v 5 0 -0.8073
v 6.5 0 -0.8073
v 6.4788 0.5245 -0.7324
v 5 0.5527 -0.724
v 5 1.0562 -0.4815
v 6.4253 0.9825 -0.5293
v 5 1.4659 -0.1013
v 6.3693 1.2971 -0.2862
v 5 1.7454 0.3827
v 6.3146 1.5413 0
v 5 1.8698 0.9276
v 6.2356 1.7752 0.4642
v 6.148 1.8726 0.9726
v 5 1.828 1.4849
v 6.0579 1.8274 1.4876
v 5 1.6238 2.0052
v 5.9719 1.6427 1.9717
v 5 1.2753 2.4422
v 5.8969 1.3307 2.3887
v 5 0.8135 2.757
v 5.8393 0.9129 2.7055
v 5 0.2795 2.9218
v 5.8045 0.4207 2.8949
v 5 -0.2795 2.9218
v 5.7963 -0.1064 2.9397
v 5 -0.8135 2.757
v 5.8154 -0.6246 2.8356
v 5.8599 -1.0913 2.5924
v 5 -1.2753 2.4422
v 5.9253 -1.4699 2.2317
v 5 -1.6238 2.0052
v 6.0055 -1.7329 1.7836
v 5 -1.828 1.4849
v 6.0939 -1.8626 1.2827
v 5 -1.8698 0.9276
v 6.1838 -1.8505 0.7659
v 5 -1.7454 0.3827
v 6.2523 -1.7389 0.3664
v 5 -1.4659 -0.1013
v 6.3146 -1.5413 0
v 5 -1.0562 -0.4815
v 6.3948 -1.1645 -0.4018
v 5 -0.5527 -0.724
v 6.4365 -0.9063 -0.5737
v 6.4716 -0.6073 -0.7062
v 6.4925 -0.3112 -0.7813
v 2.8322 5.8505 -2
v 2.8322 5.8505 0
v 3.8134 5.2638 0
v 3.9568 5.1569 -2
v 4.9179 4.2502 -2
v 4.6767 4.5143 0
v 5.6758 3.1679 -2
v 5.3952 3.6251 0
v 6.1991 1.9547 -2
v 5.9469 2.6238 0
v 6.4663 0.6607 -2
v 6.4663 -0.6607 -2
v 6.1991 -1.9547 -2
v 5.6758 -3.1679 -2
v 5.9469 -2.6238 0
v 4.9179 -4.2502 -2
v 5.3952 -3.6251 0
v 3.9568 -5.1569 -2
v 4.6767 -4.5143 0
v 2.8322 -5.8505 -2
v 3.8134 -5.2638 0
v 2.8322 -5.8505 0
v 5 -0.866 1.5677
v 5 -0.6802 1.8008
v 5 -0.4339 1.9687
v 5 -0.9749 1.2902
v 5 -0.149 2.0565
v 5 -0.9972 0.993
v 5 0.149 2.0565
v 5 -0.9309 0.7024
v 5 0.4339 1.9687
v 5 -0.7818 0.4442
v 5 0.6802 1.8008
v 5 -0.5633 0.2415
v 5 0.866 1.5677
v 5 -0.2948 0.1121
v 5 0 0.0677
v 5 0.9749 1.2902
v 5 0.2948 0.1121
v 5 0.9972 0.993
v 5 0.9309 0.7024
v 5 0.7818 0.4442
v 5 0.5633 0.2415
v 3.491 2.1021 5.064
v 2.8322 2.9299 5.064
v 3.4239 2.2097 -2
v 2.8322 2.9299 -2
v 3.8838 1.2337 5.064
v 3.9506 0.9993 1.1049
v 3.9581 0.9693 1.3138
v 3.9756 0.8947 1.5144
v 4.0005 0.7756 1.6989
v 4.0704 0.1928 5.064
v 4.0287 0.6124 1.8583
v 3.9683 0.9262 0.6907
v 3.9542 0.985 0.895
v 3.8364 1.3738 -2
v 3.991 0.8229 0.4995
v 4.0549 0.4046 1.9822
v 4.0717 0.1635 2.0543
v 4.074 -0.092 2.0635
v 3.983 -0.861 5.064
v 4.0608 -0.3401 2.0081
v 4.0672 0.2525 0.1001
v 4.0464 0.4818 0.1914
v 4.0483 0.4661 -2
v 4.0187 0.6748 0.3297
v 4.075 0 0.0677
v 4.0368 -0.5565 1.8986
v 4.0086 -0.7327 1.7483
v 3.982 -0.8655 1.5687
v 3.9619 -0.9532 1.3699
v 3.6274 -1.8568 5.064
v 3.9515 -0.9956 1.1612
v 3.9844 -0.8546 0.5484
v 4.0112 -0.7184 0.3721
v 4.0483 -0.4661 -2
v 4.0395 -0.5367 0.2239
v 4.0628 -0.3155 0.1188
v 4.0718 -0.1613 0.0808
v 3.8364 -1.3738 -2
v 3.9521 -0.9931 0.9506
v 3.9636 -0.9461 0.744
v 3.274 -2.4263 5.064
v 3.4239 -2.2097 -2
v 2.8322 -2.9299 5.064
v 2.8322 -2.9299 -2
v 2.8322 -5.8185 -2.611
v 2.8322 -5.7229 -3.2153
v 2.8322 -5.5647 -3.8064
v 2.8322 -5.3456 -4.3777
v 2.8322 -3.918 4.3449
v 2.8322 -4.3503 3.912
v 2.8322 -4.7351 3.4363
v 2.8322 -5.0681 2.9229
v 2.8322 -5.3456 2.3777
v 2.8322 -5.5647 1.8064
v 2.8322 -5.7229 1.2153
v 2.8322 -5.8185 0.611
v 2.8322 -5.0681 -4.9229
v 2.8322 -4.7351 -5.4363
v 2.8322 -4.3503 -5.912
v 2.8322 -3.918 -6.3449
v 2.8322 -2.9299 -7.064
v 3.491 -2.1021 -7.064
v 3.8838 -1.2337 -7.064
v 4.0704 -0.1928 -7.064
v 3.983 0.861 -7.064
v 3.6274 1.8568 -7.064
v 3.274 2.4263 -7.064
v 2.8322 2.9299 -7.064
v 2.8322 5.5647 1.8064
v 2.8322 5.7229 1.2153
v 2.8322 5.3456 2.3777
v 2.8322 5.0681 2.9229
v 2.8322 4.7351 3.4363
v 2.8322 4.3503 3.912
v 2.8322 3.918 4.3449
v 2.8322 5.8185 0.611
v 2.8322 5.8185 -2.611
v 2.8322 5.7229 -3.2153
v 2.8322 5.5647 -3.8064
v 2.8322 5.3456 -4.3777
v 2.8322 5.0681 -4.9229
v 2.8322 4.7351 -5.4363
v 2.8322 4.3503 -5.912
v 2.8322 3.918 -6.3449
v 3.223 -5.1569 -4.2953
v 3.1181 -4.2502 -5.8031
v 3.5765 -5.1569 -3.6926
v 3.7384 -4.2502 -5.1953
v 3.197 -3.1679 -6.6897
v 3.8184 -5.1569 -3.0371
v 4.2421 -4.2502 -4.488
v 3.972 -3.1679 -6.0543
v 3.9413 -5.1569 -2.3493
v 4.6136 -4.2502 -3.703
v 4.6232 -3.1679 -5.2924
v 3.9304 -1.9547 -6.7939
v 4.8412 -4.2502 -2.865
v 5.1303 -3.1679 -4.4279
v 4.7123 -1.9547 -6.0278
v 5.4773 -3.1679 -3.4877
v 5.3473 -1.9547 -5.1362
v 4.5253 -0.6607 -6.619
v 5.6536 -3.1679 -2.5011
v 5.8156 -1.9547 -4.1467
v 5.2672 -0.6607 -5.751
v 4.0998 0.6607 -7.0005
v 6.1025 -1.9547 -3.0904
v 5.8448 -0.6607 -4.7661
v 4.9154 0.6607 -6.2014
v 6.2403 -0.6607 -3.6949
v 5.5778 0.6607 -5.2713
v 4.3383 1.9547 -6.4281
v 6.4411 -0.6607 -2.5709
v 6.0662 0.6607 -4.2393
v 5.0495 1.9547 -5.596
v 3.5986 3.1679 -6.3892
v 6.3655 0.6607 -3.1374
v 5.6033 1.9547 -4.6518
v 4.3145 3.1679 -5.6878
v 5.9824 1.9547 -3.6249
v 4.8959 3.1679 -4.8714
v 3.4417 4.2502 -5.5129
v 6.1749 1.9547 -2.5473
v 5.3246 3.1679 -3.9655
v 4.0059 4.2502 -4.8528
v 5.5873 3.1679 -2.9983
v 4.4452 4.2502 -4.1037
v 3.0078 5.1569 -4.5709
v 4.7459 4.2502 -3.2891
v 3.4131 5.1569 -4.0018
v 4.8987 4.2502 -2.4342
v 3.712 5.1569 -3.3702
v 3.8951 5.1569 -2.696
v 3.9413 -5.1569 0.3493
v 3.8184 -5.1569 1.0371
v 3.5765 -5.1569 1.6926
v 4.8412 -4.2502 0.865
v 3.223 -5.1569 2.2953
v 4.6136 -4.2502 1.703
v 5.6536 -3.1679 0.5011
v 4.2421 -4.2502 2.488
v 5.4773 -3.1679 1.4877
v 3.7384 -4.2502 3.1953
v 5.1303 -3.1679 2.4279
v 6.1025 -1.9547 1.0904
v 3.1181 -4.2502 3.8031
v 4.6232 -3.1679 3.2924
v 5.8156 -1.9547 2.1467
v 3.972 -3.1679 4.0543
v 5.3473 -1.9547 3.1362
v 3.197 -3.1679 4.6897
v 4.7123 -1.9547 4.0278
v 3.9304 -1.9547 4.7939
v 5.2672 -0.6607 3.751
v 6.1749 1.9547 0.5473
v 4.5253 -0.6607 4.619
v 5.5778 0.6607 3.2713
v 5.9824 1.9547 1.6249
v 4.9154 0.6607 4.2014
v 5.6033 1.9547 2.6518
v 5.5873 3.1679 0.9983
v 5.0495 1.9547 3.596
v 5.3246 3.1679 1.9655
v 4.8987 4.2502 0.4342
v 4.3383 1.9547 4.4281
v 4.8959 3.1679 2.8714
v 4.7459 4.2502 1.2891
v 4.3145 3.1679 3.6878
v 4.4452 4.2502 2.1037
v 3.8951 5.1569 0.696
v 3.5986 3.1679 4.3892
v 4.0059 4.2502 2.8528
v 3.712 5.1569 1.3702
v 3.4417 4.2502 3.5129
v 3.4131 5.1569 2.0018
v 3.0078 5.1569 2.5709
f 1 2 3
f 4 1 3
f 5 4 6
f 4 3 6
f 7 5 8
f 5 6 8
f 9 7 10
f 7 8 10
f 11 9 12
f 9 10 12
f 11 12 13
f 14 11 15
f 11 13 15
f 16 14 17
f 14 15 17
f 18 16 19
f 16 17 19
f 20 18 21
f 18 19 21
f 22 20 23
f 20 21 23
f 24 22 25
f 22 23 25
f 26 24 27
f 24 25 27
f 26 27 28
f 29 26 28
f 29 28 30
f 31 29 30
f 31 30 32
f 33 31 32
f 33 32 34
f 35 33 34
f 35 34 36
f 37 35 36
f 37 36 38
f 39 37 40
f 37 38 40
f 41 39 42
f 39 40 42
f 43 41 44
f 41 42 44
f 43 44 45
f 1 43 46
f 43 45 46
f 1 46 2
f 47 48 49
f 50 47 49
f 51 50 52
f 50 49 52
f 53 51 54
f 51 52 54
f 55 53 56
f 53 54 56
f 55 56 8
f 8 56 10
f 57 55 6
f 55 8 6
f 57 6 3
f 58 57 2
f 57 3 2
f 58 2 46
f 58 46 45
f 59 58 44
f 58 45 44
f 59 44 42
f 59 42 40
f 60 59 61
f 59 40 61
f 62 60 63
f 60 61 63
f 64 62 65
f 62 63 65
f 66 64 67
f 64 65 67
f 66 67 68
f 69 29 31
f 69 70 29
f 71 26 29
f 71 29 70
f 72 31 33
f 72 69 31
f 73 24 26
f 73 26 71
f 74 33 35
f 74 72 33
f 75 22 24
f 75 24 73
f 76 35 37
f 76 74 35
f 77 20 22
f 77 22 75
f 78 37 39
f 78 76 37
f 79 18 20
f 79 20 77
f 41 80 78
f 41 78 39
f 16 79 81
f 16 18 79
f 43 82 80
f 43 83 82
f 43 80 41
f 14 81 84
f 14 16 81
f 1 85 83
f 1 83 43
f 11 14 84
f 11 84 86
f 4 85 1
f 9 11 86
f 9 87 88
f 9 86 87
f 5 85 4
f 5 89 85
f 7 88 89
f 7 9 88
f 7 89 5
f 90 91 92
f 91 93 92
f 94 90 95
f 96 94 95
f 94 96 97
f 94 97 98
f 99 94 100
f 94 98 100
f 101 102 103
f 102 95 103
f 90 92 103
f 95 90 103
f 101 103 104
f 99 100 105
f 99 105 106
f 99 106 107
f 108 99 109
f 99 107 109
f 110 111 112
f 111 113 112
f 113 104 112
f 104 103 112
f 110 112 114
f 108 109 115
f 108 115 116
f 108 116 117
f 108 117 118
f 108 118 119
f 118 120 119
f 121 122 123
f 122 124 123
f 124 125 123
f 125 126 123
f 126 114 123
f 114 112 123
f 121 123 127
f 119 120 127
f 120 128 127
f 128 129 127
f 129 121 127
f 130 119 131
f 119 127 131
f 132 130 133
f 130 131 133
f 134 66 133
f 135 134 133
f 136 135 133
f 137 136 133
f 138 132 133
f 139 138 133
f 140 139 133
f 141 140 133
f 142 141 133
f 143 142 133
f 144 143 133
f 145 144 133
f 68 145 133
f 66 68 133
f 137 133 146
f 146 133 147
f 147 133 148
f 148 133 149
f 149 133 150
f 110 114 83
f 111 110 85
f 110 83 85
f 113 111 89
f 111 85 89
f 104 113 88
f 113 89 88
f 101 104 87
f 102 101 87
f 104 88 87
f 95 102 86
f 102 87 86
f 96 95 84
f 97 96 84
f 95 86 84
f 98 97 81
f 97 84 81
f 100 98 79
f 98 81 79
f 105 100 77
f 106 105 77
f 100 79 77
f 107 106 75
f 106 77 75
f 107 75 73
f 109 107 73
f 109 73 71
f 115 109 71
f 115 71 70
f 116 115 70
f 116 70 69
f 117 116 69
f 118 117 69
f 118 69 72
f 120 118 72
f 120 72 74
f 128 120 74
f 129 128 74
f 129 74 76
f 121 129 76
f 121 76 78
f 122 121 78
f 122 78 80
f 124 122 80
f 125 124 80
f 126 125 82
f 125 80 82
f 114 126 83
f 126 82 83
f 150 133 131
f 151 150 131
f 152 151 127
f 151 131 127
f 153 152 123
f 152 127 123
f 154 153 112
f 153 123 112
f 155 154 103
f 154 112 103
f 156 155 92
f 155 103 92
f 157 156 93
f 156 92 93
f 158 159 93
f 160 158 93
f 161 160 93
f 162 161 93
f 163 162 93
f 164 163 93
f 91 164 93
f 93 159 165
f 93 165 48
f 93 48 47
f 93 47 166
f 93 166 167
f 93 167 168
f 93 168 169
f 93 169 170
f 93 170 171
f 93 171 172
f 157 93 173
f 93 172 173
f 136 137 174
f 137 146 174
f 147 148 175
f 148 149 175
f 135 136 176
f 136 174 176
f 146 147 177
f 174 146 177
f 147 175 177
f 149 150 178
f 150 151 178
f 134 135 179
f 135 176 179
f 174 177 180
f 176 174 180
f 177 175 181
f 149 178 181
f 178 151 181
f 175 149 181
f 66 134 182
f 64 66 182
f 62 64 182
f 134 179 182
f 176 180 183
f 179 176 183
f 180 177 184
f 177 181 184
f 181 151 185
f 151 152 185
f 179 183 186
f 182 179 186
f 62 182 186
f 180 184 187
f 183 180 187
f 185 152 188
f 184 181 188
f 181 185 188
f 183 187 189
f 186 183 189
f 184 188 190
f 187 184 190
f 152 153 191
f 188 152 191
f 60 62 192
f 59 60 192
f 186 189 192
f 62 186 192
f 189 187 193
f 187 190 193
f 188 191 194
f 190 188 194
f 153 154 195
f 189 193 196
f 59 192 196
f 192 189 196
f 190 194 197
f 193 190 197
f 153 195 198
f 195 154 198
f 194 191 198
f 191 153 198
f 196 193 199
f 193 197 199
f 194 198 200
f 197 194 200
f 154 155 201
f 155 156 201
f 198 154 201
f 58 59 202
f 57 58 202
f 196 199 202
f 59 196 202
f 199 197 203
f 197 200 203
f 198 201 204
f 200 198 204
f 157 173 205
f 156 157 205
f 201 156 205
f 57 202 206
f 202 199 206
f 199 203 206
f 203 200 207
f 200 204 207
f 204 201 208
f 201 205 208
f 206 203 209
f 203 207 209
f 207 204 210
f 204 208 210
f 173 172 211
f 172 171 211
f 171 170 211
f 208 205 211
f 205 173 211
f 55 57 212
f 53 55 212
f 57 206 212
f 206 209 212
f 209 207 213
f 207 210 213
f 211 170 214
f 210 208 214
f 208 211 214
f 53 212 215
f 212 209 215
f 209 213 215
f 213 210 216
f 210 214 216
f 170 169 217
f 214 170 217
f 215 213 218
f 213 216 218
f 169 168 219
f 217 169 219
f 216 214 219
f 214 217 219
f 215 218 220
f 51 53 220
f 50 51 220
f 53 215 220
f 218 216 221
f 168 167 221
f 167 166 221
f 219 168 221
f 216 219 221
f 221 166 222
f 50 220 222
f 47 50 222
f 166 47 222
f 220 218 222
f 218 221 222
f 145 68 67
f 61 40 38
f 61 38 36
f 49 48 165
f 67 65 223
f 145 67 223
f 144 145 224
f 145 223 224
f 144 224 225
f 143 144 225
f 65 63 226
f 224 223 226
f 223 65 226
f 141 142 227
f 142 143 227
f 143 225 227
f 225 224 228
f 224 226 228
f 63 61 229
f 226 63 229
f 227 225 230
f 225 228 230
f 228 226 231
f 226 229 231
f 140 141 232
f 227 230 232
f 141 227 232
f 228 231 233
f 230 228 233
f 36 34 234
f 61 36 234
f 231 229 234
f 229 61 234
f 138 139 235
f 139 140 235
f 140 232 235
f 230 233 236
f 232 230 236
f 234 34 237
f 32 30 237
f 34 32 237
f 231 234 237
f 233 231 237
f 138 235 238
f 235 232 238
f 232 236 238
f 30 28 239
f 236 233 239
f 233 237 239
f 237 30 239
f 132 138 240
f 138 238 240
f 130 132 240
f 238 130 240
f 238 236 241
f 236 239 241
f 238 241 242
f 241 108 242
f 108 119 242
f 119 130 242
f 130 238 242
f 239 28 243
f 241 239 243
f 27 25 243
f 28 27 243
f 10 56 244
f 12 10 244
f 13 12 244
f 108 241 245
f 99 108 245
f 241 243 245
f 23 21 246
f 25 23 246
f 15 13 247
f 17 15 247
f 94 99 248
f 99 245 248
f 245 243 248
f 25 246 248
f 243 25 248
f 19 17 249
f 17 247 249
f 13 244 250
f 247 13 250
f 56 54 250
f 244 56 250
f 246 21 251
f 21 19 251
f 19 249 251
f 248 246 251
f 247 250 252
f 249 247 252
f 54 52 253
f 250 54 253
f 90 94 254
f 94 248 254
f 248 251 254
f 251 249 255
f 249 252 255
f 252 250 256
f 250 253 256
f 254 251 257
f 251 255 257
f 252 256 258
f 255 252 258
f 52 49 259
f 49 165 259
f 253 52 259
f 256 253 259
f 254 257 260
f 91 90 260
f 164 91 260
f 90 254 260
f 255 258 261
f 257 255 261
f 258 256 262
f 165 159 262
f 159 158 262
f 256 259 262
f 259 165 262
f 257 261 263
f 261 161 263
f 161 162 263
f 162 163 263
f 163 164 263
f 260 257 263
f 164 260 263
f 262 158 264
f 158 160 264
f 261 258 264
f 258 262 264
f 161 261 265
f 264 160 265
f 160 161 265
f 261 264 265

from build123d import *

# Parameters (mm, degrees)
BODY_ANGLE                  = 180
HOLE_FOR_HANDLE_DEPTH       = 7.5
SKETCH6_R                   = 1.1303
F_5_40_SET_SCREW_HOLE_DEPTH = 7
SKETCH8_R                   = 0.75
HOLE_FOR_CABLE_DEPTH        = 7
SKETCH9_R                   = 6.5
SKETCH9_R_2                 = 0.75
BOSS_EXTRUDE1_DEPTH         = 2
SKETCH10_R                  = 0.8
F_2X0_4_SCREW_HOLE_DEPTH    = 14
SKETCH11_R                  = 1
CUT_EXTRUDE5_DEPTH          = 4
SKETCH12_R                  = 1.875
CUT_EXTRUDE6_DEPTH          = 1.5
REVOLVE4_ANGLE              = 180
SKETCH14_R                  = 0.75
CUT_EXTRUDE7_DEPTH          = 7.5
SKETCH15_W                  = 12.911147491
SKETCH15_H                  = 21.852119754
CUT_EXTRUDE9_DEPTH          = 14.0000001


with BuildPart() as part:
    # Sketch3 → body (revolve)
    with BuildSketch(Plane.XY):
        with BuildLine():
            Line((0, 6.5), (0, -6.5))
            ThreePointArc((0, -6.5), (6.5, 0), (0, 6.5))
        make_face()
    revolve(axis=Axis((0, 6.5, 0), (0, -1, 0)), revolution_arc=BODY_ANGLE)

    # Sketch5 → hole for handle (cut, through all)
    with BuildSketch(Plane(origin=(0, 0, 0), x_dir=(-1, 0, 0), z_dir=(0, 0, -1))):
        with BuildLine():
            Line((1.5, 3.688881761), (1.5, 2.702827207))
            Line((1.5, 2.702827207), (-1.5, 2.702827207))
            Line((-1.5, 2.702827207), (-1.5, 3.688881761))
            Line((-1.5, 3.688881761), (-1.5, 3.788881761))
            ThreePointArc((-1.5, 3.788881761), (0, -4.075), (1.5, 3.788881761))
            Line((1.5, 3.788881761), (1.5, 3.688881761))
        make_face()
    extrude(amount=-HOLE_FOR_HANDLE_DEPTH, mode=Mode.SUBTRACT)

    # Sketch6 → 5-40 set screw hole (cut)
    with BuildSketch(Plane(origin=(0, 6.5, 0), x_dir=(1, 0, 0), z_dir=(0, 1, 0))):
        with Locations((0, -1.564027547)):
            Circle(SKETCH6_R)
    extrude(amount=-F_5_40_SET_SCREW_HOLE_DEPTH, mode=Mode.SUBTRACT)

    # Sketch8 → hole for cable (cut)
    with BuildSketch(Plane(origin=(0, 0, 0), x_dir=(-1, 0, 0), z_dir=(0, 0, -1))):
        with Locations((0, 4.237225844)):
            Circle(SKETCH8_R)
    extrude(amount=-HOLE_FOR_CABLE_DEPTH, mode=Mode.SUBTRACT)

    # Sketch9 → Boss-Extrude1 (add)
    with BuildSketch(Plane(origin=(0, 0, 0), x_dir=(-1, 0, 0), z_dir=(0, 0, -1))):
        Circle(SKETCH9_R)
        with Locations((0, 4.237225844)):
            Circle(SKETCH9_R_2, mode=Mode.SUBTRACT)
        with BuildLine():
            Line((-1.5, 2.702827207), (-1.5, 3.788881761))
            ThreePointArc((-1.5, 3.788881761), (0, -4.075), (1.5, 3.788881761))
            Line((1.5, 3.788881761), (1.5, 2.702827207))
            Line((1.5, 2.702827207), (-1.5, 2.702827207))
        make_face(mode=Mode.SUBTRACT)
    extrude(amount=BOSS_EXTRUDE1_DEPTH)

    # Sketch10 → 2X0.4 screw hole (cut, through all)
    with BuildSketch(Plane(origin=(6.5, 0, 0), x_dir=(0, 0, -1), z_dir=(1, 0, 0))):
        with Locations((-1.067713855, 0)):
            Circle(SKETCH10_R)
    extrude(amount=-F_2X0_4_SCREW_HOLE_DEPTH, mode=Mode.SUBTRACT)

    # Sketch11 → Cut-Extrude5 (cut)
    with BuildSketch(Plane(origin=(6.5, 0, 0), x_dir=(0, 0, -1), z_dir=(1, 0, 0))):
        with Locations((-1.067713855, 0)):
            Circle(SKETCH11_R)
    extrude(amount=-CUT_EXTRUDE5_DEPTH, mode=Mode.SUBTRACT)

    # Sketch12 → Cut-Extrude6 (cut)
    with BuildSketch(Plane(origin=(6.5, 0, 0), x_dir=(0, 0, -1), z_dir=(1, 0, 0))):
        with Locations((-1.067713855, 0)):
            Circle(SKETCH12_R)
    extrude(amount=-CUT_EXTRUDE6_DEPTH, mode=Mode.SUBTRACT)

    # Sketch13 → Revolve4 (revolve)
    with BuildSketch(Plane(origin=(0, 0, -2), x_dir=(-1, 0, 0), z_dir=(0, 0, -1))):
        with BuildLine():
            Line((0, 6.5), (0, -6.5))
            ThreePointArc((0, -6.5), (6.5, 0), (0, 6.5))
        make_face()
    revolve(axis=Axis((0, 6.5, -2), (0, -1, 0)), revolution_arc=REVOLVE4_ANGLE)

    # Sketch14 → Cut-Extrude7 (cut, through all)
    with BuildSketch(Plane.XY.offset(-2)):
        with Locations((0, 4.237225844)):
            Circle(SKETCH14_R)
        with BuildLine():
            Line((1.5, 3.788881761), (1.5, 2.702827207))
            Line((1.5, 2.702827207), (-1.5, 2.702827207))
            Line((-1.5, 2.702827207), (-1.5, 3.788881761))
            ThreePointArc((-1.5, 3.788881761), (0, -4.075), (1.5, 3.788881761))
        make_face()
    extrude(amount=-CUT_EXTRUDE7_DEPTH, mode=Mode.SUBTRACT)

    # Sketch15 → Cut-Extrude9 (cut, through all)
    with BuildSketch(Plane(origin=(0, 6.5, 0), x_dir=(1, 0, 0), z_dir=(0, 1, 0))):
        with Locations((-3.623390746, 1.595465377)):
            Rectangle(SKETCH15_W, SKETCH15_H)
    extrude(amount=-CUT_EXTRUDE9_DEPTH, mode=Mode.SUBTRACT)


solid = part.part
